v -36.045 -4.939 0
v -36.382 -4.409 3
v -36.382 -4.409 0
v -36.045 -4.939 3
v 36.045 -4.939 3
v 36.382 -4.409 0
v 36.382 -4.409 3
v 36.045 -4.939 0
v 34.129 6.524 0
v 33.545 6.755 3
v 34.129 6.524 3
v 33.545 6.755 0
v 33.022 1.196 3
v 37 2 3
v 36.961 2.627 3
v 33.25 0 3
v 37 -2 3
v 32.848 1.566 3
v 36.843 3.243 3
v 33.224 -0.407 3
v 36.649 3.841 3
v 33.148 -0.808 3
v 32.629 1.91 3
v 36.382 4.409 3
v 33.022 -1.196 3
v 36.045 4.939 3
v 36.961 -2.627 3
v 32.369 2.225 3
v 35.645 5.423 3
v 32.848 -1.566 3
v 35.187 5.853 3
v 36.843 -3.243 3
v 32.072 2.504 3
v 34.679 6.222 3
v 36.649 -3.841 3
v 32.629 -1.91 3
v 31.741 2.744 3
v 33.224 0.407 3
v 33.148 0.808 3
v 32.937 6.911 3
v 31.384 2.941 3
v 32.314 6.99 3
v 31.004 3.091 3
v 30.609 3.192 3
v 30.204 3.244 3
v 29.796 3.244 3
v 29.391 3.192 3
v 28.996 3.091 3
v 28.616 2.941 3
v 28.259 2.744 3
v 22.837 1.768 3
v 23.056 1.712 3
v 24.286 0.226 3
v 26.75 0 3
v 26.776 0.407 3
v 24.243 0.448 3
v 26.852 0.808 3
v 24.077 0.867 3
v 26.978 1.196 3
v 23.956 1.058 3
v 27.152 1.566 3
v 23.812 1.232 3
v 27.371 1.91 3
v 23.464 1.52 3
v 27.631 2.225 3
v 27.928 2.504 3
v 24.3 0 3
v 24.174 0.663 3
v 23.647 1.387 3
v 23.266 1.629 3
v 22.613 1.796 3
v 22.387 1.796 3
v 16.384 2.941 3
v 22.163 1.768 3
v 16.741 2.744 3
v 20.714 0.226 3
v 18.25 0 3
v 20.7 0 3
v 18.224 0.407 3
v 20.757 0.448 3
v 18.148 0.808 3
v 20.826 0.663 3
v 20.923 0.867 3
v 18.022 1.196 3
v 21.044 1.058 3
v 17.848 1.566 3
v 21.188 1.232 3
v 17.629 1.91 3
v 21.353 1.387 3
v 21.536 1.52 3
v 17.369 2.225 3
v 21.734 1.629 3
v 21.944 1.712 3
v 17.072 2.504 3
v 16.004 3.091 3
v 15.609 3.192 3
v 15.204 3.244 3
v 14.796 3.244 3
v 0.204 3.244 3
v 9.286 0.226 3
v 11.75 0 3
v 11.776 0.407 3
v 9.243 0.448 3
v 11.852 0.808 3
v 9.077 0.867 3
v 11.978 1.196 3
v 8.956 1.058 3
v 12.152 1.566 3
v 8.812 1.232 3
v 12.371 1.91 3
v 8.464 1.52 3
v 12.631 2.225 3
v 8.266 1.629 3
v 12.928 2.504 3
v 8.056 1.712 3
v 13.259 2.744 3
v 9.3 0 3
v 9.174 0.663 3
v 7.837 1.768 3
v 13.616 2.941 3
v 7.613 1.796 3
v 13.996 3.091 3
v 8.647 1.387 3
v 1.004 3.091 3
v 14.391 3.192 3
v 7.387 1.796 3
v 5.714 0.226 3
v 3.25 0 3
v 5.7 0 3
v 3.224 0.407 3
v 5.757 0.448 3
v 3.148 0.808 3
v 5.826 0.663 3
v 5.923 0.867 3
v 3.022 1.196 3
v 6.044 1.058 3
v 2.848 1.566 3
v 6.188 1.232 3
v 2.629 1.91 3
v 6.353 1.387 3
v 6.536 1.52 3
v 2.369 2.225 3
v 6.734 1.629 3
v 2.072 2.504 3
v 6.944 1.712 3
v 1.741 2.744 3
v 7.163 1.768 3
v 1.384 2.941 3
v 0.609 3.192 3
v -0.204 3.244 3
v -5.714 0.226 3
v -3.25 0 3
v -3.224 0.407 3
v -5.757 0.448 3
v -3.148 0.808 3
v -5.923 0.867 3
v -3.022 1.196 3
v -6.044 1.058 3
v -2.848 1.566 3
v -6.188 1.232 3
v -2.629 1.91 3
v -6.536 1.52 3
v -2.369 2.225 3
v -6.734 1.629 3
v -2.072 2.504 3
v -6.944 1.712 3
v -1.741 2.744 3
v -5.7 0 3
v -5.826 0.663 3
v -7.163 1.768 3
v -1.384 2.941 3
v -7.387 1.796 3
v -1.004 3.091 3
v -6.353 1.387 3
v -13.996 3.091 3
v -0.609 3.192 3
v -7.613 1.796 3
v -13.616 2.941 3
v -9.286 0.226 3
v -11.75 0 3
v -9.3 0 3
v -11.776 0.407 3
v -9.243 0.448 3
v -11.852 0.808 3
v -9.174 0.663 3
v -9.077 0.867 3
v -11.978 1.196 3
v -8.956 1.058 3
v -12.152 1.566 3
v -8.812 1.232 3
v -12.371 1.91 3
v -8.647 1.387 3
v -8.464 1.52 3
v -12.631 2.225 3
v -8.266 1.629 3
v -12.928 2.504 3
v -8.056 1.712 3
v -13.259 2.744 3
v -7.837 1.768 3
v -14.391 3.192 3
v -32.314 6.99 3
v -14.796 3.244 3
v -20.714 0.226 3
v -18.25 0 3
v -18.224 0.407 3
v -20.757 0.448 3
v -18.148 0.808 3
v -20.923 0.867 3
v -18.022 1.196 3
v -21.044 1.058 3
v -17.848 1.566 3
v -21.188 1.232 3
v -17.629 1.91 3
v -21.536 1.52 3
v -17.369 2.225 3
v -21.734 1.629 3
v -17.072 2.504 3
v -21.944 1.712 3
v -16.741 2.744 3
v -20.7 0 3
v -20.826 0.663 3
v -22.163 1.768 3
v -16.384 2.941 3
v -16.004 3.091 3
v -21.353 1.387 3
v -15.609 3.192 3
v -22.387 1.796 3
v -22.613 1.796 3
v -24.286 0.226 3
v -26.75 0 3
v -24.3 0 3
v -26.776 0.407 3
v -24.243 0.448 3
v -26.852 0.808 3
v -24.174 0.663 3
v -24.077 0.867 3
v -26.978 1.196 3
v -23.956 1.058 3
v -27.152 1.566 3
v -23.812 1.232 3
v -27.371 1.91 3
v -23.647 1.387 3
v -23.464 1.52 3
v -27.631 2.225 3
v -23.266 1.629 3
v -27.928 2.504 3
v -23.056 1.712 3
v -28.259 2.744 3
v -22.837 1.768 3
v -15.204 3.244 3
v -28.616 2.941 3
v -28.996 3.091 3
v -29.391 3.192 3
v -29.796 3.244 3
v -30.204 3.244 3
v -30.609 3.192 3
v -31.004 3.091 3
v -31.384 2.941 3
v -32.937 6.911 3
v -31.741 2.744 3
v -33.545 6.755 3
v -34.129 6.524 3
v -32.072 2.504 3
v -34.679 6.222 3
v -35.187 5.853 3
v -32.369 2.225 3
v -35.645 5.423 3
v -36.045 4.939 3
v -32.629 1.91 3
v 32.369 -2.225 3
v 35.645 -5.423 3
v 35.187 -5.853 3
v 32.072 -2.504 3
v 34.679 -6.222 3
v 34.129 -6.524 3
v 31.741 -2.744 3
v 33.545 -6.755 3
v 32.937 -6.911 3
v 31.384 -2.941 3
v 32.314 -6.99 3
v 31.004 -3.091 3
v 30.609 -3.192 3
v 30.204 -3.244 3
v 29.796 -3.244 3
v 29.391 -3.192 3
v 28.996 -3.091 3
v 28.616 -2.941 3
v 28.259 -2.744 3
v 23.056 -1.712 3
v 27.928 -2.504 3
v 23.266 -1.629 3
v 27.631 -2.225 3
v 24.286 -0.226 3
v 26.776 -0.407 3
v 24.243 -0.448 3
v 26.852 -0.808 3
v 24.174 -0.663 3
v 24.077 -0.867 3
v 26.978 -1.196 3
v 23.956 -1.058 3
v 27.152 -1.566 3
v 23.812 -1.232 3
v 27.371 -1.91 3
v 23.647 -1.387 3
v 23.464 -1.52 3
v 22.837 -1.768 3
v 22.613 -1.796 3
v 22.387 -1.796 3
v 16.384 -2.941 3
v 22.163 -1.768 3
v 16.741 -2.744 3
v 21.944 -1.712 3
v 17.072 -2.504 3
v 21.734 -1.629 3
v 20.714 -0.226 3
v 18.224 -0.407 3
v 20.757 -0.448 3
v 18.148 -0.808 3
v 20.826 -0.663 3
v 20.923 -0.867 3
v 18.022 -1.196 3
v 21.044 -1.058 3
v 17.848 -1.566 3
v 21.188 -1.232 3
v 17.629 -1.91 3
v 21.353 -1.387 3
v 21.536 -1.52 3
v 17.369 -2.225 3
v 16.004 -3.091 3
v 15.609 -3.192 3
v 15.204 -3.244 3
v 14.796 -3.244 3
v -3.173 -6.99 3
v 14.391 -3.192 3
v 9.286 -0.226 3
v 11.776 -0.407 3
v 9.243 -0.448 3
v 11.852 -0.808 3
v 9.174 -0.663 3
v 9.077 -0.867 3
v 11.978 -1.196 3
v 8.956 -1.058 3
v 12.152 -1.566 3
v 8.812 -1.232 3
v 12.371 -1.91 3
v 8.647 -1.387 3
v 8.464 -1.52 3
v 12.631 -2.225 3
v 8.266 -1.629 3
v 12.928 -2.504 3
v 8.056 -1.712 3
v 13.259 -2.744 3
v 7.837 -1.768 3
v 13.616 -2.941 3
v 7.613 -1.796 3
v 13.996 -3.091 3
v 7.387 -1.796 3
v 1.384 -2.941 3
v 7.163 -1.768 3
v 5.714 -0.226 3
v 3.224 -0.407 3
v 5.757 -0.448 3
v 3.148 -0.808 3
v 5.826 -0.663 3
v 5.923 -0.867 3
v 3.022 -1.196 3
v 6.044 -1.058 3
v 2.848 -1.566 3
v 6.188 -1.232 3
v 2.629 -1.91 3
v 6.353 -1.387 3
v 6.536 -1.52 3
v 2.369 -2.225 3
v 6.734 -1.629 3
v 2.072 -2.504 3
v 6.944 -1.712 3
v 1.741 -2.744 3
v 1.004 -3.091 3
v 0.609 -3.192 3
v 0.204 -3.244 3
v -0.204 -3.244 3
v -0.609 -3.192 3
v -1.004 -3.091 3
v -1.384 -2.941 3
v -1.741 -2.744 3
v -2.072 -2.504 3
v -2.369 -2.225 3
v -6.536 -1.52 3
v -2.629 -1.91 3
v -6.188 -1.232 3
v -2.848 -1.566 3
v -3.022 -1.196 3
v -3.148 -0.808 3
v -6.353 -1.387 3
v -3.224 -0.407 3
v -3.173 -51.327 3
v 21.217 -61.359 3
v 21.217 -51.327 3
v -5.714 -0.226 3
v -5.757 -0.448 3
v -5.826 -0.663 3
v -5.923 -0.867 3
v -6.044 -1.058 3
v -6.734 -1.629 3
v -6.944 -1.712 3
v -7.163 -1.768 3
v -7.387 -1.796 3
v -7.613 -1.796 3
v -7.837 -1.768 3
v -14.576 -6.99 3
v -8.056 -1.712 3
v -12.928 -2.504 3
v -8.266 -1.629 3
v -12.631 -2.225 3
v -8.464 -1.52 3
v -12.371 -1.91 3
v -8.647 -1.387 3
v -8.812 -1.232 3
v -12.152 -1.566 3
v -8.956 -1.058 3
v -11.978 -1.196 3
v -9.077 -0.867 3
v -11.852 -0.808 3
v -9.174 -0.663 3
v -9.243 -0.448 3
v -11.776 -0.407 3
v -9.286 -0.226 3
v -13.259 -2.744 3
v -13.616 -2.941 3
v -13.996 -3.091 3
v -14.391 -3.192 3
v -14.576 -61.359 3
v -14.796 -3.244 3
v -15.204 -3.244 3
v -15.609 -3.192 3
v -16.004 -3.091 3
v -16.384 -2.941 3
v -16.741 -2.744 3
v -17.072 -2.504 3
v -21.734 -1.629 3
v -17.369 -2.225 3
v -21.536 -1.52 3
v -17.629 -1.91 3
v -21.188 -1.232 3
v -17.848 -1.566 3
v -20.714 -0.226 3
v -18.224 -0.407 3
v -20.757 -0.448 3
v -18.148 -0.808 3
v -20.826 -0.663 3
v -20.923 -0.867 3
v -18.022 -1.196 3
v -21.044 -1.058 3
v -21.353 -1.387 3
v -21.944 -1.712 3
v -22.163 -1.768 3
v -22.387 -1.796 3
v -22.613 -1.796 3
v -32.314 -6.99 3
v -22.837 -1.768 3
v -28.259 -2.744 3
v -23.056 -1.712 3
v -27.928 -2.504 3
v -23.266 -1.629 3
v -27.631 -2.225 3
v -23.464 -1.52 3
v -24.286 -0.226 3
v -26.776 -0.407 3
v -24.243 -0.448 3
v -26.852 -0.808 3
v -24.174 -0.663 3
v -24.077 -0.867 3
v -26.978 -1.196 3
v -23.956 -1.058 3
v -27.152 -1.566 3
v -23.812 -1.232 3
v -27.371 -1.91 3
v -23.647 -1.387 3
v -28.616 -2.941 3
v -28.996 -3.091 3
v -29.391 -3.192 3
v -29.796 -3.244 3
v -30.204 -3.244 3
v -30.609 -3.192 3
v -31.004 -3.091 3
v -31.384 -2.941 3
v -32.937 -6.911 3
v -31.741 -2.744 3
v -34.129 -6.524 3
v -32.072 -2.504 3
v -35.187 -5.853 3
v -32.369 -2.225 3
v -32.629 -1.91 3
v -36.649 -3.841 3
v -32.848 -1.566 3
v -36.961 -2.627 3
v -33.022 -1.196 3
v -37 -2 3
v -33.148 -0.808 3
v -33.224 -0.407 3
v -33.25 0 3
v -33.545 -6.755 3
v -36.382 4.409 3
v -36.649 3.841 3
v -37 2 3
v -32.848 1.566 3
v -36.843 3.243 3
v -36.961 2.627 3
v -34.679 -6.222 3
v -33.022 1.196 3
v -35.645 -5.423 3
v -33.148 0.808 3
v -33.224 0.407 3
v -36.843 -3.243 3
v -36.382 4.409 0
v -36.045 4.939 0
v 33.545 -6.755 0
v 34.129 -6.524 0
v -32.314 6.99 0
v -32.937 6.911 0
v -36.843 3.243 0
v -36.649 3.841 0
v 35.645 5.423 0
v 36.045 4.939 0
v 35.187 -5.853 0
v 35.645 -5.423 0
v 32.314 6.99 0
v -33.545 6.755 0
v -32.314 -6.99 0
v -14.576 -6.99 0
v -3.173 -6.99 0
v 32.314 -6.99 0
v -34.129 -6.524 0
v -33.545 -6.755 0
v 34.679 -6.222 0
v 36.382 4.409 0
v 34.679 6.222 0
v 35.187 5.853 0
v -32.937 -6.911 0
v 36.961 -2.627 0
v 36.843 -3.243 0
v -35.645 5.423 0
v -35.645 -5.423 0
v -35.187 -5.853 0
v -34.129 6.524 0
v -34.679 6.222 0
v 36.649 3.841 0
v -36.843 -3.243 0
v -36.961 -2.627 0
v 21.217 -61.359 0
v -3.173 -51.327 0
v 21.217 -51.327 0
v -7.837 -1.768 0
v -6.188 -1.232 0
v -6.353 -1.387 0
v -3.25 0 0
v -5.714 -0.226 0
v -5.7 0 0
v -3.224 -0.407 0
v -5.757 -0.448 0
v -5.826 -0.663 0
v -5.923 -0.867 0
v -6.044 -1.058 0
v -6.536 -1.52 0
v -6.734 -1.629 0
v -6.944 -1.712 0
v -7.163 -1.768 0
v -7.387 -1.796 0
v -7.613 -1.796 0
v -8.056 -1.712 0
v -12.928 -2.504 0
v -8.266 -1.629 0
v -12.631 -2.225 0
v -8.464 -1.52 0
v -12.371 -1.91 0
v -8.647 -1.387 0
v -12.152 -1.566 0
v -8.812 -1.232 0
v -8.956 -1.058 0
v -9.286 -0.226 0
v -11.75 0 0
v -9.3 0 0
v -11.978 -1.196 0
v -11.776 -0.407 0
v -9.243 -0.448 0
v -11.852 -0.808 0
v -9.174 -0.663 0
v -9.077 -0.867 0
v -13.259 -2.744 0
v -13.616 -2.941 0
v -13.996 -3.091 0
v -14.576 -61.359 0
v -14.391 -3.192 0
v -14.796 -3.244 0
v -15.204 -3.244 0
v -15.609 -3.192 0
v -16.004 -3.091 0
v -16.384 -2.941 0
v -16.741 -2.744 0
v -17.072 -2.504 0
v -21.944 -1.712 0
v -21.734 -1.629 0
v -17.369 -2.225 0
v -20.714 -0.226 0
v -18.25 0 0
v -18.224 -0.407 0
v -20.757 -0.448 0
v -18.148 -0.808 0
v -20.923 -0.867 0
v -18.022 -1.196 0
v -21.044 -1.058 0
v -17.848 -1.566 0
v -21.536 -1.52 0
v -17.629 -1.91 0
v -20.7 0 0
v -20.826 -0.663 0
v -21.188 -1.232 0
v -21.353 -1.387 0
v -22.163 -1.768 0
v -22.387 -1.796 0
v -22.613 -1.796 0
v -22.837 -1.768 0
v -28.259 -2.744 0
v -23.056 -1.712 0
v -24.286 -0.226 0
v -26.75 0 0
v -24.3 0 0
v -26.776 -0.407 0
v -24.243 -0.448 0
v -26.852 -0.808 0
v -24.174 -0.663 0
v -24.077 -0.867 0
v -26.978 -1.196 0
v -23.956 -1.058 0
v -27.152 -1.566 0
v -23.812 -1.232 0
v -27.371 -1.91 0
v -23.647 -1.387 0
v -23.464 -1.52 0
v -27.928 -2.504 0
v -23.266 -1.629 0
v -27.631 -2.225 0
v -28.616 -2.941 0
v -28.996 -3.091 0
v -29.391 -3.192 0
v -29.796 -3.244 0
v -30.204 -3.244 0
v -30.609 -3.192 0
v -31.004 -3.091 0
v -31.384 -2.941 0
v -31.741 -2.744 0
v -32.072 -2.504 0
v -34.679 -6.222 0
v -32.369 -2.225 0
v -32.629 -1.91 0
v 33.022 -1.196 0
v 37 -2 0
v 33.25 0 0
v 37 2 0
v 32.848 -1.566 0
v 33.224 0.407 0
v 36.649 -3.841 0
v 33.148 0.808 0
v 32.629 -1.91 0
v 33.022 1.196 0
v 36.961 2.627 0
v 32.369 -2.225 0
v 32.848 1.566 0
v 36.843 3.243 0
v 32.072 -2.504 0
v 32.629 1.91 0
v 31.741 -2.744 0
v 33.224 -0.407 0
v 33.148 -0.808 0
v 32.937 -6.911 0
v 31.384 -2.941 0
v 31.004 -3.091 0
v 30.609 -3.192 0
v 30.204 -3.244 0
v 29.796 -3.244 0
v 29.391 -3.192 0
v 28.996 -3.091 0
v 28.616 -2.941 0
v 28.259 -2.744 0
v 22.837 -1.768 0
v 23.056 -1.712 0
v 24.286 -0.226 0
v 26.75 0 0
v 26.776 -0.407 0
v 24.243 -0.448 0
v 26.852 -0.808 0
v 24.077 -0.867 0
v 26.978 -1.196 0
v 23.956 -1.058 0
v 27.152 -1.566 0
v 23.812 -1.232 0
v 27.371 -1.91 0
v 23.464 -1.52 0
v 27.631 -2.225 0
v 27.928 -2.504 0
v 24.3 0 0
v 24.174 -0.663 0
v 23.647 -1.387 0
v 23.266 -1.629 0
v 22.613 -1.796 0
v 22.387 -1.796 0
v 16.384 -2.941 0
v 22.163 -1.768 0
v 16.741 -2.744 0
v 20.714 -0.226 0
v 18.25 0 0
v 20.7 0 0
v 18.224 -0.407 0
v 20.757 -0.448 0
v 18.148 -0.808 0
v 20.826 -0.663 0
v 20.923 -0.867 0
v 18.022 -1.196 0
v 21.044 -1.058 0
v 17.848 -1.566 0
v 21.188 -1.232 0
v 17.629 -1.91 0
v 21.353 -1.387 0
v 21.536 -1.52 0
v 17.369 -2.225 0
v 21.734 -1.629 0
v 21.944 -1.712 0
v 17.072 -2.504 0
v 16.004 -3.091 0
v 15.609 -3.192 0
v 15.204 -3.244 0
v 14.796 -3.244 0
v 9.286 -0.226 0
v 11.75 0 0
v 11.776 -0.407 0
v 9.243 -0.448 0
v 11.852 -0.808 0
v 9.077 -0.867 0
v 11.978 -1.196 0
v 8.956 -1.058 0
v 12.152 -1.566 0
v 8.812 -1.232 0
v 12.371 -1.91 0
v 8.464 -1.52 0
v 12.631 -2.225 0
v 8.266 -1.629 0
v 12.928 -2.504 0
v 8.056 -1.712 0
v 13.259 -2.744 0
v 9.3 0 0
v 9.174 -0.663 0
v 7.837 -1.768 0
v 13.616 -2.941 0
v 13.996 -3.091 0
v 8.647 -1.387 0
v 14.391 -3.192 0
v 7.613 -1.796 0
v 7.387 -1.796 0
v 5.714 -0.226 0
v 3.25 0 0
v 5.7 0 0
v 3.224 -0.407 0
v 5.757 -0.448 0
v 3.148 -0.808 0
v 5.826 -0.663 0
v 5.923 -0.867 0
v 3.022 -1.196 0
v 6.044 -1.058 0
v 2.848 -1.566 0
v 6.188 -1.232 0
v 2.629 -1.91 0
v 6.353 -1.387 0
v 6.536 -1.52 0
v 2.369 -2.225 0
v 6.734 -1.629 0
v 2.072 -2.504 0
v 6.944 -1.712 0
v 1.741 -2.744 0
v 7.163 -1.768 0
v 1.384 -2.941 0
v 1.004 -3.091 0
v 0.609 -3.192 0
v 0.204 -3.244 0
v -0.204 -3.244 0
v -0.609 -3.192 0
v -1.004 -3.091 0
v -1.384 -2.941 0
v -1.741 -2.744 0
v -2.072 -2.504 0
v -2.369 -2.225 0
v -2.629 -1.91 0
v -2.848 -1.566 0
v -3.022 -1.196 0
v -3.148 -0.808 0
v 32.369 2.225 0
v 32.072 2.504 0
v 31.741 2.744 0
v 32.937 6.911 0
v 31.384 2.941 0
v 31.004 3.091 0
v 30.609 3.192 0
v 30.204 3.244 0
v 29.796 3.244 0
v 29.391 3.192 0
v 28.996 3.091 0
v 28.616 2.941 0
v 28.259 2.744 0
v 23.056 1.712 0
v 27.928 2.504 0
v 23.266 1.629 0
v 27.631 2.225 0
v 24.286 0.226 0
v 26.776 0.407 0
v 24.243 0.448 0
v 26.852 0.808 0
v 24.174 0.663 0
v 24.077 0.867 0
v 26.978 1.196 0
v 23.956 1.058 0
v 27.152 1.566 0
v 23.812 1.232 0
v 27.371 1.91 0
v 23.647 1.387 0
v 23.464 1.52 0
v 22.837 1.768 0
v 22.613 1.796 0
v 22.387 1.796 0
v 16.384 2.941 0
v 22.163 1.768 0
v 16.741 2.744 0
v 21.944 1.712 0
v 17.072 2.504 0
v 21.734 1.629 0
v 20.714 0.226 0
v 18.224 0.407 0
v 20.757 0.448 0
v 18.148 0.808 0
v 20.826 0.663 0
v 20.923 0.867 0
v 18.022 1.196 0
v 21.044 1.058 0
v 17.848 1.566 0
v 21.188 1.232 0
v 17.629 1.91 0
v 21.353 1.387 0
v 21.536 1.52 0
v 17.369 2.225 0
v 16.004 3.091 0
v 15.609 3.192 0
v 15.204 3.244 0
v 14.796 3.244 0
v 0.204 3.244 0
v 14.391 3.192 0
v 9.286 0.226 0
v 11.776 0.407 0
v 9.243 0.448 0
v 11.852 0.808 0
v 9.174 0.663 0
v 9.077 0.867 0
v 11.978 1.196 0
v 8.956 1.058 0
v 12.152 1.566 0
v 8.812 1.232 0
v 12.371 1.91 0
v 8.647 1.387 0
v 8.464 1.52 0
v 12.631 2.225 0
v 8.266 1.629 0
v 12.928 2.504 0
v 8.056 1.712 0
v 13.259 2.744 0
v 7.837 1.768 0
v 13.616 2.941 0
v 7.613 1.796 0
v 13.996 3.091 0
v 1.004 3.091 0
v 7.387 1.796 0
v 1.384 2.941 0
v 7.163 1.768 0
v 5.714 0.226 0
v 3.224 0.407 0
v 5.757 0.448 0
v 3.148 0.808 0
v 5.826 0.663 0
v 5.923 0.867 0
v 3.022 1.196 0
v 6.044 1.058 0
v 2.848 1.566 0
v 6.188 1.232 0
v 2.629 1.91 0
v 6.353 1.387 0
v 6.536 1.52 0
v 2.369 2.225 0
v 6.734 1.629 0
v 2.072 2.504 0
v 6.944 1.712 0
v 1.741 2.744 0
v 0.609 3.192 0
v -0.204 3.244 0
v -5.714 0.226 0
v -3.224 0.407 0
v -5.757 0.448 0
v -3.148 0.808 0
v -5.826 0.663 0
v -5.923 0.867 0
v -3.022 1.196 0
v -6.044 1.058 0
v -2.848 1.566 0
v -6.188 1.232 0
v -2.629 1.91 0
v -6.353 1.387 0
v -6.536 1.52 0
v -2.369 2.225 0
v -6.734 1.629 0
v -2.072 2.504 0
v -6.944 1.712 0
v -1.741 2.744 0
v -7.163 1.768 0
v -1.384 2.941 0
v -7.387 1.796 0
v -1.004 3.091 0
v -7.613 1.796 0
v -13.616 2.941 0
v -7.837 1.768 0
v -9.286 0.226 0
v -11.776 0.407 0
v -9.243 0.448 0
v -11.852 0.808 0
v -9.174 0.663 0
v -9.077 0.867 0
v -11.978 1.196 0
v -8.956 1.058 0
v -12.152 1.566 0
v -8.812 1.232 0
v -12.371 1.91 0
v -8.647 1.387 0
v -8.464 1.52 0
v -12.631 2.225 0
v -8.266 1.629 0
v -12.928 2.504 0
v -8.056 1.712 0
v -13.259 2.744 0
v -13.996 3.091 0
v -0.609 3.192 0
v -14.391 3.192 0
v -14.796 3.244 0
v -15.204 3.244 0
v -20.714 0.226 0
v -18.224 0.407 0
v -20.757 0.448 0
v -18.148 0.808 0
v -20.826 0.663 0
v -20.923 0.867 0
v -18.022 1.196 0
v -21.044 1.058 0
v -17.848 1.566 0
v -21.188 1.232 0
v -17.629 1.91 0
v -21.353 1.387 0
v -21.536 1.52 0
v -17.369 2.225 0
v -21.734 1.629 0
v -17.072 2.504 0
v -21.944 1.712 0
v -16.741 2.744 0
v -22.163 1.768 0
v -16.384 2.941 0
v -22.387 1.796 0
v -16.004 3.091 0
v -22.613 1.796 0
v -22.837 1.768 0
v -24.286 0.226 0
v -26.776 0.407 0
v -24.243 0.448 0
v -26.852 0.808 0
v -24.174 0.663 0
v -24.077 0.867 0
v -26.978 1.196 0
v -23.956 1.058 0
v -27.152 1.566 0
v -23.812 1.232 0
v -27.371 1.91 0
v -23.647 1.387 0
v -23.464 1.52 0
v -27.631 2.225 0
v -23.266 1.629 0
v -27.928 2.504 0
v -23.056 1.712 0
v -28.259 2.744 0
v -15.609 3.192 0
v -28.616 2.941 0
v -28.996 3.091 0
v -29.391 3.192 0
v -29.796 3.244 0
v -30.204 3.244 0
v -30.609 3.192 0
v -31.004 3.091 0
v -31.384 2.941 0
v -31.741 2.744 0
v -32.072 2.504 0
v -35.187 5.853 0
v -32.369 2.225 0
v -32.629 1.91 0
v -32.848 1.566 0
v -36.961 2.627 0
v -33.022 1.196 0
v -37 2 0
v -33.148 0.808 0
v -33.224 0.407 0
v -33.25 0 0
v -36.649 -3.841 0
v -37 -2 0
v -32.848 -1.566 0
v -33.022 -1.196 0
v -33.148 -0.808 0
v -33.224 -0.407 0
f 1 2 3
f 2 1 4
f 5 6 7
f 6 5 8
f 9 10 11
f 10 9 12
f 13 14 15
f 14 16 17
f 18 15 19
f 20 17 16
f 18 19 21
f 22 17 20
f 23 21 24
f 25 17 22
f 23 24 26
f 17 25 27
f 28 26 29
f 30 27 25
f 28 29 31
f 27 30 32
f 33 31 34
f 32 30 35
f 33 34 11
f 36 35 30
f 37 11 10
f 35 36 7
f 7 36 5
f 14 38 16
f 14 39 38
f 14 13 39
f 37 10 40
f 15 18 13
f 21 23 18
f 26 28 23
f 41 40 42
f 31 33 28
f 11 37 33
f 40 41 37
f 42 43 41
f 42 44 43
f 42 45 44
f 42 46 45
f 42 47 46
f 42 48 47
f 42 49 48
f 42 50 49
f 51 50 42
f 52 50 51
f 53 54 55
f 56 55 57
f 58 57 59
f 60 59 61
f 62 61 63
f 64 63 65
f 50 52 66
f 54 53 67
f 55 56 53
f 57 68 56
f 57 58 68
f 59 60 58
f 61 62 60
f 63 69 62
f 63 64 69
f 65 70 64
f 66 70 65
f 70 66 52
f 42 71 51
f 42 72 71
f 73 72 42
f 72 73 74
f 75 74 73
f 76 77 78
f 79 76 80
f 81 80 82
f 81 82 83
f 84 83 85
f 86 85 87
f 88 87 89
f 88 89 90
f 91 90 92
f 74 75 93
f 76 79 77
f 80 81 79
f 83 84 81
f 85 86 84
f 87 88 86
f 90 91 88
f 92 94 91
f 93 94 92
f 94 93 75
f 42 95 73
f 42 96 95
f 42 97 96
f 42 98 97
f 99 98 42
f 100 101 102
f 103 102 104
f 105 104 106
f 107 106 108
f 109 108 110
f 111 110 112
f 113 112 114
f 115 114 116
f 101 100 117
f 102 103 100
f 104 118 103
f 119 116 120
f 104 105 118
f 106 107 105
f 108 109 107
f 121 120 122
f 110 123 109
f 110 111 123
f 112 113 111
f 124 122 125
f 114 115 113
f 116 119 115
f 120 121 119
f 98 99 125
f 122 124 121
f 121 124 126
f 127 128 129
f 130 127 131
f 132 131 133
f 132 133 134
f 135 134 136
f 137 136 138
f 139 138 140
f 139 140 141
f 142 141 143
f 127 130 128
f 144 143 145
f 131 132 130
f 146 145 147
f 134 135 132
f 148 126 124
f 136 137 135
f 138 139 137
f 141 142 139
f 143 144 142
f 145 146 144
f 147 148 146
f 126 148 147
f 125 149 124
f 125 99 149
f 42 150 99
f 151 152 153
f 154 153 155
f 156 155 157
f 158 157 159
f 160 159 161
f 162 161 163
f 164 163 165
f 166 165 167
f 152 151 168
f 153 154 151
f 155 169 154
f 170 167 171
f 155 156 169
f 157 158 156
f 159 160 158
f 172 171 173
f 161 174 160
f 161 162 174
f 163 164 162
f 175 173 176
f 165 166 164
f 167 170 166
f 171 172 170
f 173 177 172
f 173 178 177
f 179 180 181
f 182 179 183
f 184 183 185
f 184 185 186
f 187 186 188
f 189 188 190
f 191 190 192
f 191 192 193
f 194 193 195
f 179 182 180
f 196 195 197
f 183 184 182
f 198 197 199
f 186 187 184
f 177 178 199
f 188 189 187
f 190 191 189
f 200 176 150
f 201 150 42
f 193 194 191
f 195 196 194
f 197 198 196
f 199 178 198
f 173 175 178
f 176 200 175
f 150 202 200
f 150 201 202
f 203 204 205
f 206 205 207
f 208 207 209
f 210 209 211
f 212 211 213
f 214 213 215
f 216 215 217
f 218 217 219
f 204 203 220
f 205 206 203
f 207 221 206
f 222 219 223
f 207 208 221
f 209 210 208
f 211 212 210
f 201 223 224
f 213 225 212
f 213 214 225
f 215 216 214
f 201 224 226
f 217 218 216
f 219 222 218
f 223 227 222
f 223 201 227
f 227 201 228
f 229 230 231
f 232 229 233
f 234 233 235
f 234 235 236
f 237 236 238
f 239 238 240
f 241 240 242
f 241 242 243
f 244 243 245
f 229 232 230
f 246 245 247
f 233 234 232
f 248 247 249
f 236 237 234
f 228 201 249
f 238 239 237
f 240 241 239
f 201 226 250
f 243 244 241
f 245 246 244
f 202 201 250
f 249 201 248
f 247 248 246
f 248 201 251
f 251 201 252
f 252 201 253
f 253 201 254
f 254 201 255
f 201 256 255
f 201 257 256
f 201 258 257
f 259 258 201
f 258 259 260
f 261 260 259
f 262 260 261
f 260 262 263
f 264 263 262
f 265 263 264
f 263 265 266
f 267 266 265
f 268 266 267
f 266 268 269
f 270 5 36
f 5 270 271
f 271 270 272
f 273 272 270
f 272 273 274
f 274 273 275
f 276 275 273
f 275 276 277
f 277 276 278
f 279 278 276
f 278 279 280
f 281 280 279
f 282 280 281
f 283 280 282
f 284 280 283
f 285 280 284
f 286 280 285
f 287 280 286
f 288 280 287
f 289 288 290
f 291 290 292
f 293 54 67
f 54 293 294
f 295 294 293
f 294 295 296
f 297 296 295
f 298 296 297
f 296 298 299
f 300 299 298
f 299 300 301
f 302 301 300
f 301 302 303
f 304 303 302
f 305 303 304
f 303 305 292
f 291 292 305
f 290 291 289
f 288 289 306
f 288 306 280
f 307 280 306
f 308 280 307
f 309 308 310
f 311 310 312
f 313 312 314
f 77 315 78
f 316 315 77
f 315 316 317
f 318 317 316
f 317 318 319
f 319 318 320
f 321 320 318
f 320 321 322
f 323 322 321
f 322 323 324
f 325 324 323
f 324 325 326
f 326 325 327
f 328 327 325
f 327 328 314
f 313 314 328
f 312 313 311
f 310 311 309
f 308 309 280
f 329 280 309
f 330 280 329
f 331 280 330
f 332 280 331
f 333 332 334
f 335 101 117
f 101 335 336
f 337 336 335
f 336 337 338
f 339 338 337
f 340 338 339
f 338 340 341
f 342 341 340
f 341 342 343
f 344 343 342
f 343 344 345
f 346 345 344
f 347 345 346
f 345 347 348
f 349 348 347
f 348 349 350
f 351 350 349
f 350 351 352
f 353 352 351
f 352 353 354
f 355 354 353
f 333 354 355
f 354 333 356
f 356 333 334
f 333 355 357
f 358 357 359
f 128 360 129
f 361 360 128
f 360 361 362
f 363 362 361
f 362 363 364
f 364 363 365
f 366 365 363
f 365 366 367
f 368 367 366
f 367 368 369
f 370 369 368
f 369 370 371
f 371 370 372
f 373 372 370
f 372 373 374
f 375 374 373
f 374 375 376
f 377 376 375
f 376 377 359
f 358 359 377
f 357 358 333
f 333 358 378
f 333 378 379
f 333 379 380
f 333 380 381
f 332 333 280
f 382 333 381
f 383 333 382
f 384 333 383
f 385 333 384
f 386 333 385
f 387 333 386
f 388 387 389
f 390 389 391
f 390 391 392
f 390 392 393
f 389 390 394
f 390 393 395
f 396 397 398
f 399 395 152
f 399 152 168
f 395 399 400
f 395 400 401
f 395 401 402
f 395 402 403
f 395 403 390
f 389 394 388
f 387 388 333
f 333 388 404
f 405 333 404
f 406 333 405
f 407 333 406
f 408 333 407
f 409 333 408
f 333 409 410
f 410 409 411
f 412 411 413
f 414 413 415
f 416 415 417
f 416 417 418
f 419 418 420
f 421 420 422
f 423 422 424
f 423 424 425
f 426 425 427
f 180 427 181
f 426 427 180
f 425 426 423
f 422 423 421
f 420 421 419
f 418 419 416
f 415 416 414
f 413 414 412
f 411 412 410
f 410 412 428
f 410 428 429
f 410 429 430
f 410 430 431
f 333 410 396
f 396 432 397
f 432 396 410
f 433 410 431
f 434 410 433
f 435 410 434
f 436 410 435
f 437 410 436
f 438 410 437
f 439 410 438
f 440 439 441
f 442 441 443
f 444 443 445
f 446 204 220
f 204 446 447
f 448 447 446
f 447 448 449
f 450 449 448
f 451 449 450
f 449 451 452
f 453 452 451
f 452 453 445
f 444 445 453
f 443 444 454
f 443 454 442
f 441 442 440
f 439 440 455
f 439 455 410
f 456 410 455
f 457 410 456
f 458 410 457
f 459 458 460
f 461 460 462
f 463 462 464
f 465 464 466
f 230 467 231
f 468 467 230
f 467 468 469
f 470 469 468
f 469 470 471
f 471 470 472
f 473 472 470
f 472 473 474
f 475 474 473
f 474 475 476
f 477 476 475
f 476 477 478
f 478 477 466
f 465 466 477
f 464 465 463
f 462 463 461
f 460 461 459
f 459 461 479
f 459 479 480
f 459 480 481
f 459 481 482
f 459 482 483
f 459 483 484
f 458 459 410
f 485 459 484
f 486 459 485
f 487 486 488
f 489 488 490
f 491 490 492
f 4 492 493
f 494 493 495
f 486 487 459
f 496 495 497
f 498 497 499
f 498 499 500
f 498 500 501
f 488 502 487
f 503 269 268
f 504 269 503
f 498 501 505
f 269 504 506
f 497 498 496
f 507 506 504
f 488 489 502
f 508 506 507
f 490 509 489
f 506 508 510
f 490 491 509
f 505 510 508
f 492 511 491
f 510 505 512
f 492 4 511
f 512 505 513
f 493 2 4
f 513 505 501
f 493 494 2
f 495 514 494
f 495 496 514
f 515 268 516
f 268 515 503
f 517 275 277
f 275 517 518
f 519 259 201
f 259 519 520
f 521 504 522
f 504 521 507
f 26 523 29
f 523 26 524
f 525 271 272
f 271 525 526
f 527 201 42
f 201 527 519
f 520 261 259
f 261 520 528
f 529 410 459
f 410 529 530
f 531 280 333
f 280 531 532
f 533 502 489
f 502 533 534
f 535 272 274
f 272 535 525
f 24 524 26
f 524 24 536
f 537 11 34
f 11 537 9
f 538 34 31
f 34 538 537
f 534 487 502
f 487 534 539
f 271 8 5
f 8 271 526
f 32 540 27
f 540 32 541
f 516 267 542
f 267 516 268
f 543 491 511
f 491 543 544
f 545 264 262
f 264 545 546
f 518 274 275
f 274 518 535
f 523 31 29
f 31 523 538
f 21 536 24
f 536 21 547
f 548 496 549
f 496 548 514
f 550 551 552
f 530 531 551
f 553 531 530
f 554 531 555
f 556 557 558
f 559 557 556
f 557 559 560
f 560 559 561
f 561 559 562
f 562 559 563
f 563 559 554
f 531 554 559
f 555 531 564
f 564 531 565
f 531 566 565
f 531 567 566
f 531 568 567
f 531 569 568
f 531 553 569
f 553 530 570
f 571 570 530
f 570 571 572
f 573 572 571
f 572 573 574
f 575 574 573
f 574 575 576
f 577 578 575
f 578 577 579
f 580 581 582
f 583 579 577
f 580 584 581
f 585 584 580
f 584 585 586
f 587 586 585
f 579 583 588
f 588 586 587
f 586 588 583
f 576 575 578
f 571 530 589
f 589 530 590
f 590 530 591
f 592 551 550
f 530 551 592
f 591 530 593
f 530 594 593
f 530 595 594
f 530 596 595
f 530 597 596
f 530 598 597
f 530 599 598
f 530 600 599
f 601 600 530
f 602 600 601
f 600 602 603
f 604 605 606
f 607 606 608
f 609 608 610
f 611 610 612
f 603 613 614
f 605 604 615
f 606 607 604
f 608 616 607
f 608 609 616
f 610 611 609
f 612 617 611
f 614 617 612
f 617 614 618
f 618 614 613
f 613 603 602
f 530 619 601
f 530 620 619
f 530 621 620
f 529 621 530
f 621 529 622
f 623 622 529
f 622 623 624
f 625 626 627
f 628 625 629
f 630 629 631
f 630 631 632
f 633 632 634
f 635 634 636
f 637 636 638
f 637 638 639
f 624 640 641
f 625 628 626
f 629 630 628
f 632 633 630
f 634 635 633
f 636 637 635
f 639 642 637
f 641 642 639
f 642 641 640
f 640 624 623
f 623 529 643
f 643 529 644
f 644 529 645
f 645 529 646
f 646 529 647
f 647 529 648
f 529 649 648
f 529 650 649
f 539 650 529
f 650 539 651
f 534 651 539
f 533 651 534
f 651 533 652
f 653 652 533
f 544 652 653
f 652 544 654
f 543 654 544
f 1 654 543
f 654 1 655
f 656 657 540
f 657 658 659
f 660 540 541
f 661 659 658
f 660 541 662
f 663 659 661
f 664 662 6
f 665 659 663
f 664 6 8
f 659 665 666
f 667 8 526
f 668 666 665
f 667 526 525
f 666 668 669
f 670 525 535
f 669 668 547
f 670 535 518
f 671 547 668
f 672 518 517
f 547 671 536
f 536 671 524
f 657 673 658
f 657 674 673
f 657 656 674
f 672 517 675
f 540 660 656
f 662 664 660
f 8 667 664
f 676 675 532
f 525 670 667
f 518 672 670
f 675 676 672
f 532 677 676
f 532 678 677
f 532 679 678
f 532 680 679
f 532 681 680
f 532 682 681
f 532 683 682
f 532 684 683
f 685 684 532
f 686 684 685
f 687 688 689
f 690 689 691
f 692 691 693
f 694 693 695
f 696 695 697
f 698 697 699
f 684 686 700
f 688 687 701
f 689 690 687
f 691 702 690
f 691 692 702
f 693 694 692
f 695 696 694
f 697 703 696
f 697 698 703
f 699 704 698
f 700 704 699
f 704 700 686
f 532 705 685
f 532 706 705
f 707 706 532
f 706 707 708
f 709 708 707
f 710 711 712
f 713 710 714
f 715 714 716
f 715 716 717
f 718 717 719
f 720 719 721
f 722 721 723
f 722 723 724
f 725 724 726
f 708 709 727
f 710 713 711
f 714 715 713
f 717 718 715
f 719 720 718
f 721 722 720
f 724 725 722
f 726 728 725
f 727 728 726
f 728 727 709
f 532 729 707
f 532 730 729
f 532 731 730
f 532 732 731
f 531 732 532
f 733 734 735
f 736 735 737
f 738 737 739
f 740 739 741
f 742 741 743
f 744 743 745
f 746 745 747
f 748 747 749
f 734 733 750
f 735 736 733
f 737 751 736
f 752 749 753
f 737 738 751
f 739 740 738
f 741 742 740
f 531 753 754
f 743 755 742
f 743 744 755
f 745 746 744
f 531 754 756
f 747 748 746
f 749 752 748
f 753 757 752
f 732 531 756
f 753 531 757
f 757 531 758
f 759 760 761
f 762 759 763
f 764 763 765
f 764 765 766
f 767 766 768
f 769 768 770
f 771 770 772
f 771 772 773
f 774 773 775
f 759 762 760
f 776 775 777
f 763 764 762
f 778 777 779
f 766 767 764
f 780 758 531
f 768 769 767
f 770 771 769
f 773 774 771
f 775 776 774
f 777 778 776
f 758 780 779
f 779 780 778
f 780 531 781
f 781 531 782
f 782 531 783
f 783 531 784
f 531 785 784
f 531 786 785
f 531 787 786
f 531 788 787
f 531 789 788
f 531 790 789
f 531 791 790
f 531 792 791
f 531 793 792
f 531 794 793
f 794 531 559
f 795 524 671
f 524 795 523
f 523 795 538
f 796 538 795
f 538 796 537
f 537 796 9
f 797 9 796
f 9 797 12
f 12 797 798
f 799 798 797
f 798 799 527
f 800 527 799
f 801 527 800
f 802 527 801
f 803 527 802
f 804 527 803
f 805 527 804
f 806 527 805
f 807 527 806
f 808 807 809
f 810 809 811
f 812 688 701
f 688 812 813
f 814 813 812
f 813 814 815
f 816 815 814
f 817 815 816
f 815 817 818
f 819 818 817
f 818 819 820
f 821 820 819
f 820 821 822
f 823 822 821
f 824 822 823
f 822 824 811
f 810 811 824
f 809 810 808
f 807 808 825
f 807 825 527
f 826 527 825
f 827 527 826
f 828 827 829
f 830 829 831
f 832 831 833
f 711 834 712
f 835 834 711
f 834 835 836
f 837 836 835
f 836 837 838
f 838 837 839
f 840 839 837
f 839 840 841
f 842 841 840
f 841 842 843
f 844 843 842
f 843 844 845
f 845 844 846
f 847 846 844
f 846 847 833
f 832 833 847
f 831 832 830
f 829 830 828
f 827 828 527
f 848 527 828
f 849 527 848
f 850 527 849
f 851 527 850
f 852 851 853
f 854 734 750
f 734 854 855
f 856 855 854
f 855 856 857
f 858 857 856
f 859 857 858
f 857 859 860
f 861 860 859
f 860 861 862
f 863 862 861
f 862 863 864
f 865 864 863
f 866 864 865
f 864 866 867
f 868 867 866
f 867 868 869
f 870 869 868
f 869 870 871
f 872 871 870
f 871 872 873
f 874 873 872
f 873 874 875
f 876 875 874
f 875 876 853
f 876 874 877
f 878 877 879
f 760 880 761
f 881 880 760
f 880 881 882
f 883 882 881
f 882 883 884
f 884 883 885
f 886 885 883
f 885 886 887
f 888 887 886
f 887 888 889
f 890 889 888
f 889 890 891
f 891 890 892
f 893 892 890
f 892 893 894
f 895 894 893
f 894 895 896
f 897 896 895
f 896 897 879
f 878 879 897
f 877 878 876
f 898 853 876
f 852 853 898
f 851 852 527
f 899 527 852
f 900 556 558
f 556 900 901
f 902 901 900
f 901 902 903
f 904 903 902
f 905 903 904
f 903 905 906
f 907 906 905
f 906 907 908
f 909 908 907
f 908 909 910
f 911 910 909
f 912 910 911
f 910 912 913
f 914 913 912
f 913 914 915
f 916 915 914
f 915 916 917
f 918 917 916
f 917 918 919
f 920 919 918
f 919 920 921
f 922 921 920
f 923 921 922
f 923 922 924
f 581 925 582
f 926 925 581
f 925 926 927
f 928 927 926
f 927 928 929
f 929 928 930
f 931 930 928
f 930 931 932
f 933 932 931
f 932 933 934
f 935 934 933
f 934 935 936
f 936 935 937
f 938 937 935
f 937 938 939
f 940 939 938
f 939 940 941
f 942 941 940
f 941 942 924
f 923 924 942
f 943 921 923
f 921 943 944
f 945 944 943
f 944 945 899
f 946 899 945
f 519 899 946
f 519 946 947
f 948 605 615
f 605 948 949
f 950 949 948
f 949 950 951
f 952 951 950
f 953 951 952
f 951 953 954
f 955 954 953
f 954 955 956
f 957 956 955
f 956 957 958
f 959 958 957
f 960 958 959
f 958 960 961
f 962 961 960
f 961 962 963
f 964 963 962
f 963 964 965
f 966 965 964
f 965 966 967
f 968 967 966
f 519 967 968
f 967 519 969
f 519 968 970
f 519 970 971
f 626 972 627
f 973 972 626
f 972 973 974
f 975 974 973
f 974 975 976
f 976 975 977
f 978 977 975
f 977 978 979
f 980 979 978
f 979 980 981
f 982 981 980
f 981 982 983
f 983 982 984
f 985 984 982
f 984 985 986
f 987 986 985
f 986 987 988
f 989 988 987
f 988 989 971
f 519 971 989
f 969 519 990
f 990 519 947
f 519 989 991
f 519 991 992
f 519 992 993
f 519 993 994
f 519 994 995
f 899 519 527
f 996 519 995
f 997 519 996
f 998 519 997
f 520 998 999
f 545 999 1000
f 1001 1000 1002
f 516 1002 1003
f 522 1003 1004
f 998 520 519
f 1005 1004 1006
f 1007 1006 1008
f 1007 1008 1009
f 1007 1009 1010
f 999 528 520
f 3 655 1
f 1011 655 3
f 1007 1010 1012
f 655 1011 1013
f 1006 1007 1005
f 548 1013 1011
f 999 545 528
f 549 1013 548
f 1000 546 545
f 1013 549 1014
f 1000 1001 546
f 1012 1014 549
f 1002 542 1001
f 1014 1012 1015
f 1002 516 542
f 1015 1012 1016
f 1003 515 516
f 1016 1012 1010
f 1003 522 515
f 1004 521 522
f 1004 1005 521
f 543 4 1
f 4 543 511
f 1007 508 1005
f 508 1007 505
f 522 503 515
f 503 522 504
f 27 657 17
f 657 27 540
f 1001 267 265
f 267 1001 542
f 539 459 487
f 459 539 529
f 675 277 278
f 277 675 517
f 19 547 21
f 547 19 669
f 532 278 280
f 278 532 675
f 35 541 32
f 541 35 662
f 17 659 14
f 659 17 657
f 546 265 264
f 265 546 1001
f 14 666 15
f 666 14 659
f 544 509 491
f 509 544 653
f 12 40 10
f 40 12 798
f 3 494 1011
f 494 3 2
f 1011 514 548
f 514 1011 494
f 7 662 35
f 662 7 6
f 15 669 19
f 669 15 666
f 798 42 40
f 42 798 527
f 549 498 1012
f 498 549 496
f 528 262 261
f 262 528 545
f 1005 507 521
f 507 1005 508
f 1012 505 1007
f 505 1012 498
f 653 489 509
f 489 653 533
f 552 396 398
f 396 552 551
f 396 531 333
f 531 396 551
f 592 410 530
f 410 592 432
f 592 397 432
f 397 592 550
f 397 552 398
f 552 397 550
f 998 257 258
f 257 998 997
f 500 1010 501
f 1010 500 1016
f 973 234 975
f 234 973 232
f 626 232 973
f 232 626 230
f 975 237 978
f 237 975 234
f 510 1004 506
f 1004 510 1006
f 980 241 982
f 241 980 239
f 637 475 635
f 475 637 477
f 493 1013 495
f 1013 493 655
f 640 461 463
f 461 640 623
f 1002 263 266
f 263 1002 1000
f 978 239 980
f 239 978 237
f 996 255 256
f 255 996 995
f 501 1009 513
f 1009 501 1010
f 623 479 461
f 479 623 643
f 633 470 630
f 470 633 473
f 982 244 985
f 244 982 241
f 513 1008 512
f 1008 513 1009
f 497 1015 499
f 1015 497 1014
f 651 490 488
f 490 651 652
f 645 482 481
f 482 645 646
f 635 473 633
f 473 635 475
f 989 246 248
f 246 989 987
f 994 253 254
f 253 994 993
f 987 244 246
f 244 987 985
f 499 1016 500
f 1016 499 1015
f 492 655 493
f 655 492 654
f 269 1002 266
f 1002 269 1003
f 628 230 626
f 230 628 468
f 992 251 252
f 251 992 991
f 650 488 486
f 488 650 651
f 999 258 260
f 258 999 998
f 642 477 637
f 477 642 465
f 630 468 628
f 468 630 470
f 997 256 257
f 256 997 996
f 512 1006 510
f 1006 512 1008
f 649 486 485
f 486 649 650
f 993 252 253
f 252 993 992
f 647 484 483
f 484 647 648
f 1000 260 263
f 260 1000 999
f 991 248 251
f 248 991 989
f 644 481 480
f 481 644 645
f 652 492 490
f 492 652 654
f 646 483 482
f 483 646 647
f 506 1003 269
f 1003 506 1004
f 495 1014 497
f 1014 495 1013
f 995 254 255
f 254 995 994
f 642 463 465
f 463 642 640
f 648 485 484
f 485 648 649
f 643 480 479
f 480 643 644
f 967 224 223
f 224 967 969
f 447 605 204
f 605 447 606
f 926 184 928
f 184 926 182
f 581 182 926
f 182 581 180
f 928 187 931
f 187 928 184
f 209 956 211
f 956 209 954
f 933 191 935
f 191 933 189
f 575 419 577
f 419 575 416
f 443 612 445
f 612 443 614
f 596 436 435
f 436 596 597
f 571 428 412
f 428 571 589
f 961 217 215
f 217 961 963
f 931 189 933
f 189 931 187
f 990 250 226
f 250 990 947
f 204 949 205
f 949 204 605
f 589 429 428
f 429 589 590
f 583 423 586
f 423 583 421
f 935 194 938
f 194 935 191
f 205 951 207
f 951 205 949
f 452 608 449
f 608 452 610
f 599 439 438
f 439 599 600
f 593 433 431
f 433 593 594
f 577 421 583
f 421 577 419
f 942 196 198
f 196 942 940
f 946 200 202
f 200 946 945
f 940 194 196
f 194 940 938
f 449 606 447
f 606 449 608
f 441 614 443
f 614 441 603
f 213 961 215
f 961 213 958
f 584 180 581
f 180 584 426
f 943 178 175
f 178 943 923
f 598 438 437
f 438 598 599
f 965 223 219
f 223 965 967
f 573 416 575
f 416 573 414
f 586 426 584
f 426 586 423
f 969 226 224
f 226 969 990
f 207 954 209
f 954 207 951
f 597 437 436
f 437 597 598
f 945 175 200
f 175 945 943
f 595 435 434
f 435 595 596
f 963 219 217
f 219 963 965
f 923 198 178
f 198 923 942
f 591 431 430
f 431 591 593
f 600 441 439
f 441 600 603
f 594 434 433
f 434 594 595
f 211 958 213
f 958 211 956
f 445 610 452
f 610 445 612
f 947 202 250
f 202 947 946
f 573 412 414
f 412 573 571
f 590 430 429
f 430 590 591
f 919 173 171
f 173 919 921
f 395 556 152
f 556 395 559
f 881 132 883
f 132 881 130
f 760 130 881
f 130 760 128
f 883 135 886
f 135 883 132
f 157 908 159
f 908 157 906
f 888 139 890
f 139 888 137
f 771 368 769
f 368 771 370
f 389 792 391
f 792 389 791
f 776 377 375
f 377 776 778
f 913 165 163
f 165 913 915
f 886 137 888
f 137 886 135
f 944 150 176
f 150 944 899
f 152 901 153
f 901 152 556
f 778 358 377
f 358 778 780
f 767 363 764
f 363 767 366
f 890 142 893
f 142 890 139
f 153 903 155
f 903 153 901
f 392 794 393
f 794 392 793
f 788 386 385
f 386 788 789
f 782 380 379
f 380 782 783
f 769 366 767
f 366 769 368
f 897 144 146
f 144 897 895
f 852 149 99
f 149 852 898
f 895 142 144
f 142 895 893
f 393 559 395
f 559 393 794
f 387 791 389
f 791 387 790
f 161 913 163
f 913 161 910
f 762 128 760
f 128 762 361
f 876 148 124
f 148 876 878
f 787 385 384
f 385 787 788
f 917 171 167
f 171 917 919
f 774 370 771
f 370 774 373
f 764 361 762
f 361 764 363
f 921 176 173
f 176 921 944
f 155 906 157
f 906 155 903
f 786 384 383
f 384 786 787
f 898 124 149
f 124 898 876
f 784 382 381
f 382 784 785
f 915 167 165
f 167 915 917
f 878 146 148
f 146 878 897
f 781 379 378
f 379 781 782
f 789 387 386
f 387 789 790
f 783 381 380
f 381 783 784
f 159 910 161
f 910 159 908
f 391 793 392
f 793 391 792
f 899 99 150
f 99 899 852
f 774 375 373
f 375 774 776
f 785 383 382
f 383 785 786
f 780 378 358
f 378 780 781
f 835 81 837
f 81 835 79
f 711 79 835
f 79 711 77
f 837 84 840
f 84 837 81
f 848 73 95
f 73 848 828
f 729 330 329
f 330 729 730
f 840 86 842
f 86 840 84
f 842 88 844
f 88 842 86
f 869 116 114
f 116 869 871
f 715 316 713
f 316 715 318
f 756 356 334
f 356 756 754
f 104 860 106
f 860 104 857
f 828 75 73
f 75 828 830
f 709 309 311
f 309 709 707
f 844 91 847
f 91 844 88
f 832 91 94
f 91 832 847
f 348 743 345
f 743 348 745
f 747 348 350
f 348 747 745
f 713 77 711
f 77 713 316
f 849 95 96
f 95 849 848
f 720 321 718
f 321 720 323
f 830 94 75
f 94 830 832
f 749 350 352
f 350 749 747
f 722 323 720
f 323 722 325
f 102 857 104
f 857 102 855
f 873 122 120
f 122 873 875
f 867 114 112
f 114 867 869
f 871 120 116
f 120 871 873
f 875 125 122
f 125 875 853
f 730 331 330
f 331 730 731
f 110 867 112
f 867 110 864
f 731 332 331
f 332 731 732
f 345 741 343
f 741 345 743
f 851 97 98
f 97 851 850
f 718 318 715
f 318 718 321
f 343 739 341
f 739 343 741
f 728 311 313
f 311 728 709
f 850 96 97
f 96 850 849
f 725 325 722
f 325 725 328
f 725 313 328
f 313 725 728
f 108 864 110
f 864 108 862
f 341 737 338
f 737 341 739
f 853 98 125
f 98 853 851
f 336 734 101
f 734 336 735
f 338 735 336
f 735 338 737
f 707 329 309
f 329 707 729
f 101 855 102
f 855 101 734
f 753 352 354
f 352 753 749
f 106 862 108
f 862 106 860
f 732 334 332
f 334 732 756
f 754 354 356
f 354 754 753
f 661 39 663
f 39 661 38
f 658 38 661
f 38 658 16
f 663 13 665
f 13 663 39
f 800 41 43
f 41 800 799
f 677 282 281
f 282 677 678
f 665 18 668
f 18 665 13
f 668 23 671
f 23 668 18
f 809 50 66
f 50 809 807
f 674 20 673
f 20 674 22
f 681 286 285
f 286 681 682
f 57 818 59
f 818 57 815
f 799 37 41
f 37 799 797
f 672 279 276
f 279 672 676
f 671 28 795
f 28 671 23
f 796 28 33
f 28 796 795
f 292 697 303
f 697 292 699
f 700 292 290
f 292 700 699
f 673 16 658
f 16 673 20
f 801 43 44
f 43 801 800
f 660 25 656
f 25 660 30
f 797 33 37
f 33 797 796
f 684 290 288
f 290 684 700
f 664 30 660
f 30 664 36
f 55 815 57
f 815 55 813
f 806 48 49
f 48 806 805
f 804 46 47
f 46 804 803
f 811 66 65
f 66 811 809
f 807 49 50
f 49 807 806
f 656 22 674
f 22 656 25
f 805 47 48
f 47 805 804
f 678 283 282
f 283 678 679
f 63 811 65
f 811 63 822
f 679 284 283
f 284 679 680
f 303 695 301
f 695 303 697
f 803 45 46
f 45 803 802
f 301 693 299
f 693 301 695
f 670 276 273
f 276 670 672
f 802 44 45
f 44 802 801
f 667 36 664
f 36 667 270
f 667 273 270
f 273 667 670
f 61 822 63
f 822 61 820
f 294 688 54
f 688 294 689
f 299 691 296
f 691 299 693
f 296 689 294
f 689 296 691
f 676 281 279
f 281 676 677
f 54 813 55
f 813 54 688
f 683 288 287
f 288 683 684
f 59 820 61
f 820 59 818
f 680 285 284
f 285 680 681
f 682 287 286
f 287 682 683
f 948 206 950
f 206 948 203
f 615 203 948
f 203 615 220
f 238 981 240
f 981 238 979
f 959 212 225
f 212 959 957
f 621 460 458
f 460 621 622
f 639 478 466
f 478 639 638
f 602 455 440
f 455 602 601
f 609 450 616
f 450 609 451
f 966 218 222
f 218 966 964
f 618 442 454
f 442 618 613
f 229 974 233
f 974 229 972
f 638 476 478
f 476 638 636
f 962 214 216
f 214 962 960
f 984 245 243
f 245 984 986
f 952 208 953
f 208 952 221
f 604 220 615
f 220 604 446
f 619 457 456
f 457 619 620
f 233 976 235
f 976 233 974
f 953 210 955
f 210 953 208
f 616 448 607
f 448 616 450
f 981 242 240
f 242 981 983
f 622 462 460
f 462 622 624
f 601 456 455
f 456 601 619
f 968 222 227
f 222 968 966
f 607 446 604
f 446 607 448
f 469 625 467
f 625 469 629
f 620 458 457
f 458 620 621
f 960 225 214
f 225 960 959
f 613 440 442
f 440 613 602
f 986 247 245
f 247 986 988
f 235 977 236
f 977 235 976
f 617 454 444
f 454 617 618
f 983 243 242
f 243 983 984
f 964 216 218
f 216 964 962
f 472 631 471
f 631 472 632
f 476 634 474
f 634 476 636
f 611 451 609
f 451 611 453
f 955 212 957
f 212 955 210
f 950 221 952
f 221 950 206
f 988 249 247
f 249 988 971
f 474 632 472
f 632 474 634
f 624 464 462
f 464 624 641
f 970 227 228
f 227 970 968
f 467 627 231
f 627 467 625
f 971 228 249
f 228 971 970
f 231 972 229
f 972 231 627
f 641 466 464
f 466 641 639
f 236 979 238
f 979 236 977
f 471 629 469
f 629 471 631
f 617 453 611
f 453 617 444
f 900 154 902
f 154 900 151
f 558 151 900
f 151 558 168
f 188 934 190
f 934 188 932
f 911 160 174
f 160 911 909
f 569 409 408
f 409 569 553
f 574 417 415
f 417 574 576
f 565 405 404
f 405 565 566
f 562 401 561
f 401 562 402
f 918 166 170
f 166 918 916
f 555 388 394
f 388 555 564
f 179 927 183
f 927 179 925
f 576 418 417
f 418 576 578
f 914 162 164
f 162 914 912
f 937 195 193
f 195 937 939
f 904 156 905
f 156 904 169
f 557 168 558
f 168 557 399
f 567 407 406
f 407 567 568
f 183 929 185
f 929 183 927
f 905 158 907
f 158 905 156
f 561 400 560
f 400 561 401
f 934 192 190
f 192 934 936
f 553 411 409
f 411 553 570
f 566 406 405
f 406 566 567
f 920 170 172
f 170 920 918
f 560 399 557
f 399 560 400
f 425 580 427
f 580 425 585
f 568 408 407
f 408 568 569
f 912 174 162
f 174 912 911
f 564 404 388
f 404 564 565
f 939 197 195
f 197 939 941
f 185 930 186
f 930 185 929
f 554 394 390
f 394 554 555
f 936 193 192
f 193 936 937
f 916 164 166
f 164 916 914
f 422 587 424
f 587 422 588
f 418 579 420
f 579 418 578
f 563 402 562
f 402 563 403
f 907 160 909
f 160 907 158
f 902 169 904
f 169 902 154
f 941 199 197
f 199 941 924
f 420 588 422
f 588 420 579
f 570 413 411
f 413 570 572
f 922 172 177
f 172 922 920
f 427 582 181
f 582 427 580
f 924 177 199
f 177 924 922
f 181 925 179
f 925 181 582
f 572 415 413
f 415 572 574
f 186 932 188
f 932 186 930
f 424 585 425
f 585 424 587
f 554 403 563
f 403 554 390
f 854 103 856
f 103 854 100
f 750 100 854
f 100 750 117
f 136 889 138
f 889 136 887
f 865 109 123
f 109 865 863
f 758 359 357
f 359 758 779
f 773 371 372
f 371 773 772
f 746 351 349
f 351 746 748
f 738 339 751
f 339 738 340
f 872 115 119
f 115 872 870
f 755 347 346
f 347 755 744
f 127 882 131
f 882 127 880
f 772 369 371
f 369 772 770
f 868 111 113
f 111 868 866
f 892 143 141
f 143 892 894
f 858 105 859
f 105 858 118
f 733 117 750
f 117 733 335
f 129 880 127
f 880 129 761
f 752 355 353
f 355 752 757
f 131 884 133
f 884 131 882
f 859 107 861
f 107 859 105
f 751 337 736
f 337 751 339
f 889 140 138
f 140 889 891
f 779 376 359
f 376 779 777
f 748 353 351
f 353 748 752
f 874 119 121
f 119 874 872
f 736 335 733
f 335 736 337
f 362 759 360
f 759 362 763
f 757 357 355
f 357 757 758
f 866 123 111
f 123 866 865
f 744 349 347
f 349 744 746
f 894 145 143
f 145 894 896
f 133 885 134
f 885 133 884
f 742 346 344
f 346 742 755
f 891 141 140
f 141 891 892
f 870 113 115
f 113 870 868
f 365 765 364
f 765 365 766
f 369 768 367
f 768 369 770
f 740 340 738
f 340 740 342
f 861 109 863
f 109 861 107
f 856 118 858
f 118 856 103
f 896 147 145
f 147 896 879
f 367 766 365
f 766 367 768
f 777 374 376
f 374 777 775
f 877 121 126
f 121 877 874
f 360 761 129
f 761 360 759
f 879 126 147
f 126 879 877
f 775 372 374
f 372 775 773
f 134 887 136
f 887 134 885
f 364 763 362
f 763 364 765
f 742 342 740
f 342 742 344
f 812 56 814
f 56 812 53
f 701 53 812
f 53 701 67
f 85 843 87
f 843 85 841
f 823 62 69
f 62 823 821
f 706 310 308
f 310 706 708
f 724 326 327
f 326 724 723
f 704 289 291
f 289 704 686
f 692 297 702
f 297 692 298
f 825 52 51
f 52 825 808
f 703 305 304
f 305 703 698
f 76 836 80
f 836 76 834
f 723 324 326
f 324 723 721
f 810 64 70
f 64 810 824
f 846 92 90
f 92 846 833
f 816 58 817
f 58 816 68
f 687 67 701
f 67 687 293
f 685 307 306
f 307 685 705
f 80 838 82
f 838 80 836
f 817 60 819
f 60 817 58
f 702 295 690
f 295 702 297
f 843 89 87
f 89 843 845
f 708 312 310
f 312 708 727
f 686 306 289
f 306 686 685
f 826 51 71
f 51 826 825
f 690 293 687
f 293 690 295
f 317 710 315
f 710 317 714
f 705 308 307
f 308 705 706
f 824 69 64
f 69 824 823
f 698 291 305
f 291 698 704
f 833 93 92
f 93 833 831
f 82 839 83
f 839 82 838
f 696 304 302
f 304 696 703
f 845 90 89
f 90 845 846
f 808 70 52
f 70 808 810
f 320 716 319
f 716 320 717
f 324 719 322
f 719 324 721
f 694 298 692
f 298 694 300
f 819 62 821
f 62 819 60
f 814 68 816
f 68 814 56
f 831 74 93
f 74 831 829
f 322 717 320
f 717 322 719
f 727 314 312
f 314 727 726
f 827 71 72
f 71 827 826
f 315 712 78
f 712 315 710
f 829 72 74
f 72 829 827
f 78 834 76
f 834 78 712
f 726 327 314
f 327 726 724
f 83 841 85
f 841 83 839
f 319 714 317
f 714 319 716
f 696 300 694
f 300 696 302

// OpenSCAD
$fn = 50;


difference() {
	union() {
		hull() {
			translate(v = [-32.0000000000, 2.0000000000, 0]) {
				cylinder(h = 3, r = 5);
			}
			translate(v = [32.0000000000, 2.0000000000, 0]) {
				cylinder(h = 3, r = 5);
			}
			translate(v = [-32.0000000000, -2.0000000000, 0]) {
				cylinder(h = 3, r = 5);
			}
			translate(v = [32.0000000000, -2.0000000000, 0]) {
				cylinder(h = 3, r = 5);
			}
		}
		translate(v = [0, -5, 0]) {
			linear_extrude(height = 3) {
				text(font = "DejaVu Sans Mono:style=Bold", halign = "center", size = 57.0000000000, text = "L", valign = "top");
			}
		}
	}
	union() {
		translate(v = [-30.0000000000, 0.0000000000, 0]) {
			translate(v = [0, 0, -100]) {
				cylinder(h = 200, r = 3.2500000000);
			}
		}
		translate(v = [-15.0000000000, 0.0000000000, 0]) {
			translate(v = [0, 0, -100]) {
				cylinder(h = 200, r = 3.2500000000);
			}
		}
		translate(v = [0, 0, -100]) {
			cylinder(h = 200, r = 3.2500000000);
		}
		translate(v = [15.0000000000, 0.0000000000, 0]) {
			translate(v = [0, 0, -100]) {
				cylinder(h = 200, r = 3.2500000000);
			}
		}
		translate(v = [30.0000000000, 0.0000000000, 0]) {
			translate(v = [0, 0, -100]) {
				cylinder(h = 200, r = 3.2500000000);
			}
		}
		translate(v = [-30.0000000000, 0.0000000000, 0]) {
			translate(v = [0, 0, -100]) {
				cylinder(h = 200, r = 1.8000000000);
			}
		}
		translate(v = [-22.5000000000, 0.0000000000, 0]) {
			translate(v = [0, 0, -100]) {
				cylinder(h = 200, r = 1.8000000000);
			}
		}
		translate(v = [-15.0000000000, 0.0000000000, 0]) {
			translate(v = [0, 0, -100]) {
				cylinder(h = 200, r = 1.8000000000);
			}
		}
		translate(v = [-7.5000000000, 0.0000000000, 0]) {
			translate(v = [0, 0, -100]) {
				cylinder(h = 200, r = 1.8000000000);
			}
		}
		translate(v = [0, 0, -100]) {
			cylinder(h = 200, r = 1.8000000000);
		}
		translate(v = [7.5000000000, 0.0000000000, 0]) {
			translate(v = [0, 0, -100]) {
				cylinder(h = 200, r = 1.8000000000);
			}
		}
		translate(v = [15.0000000000, 0.0000000000, 0]) {
			translate(v = [0, 0, -100]) {
				cylinder(h = 200, r = 1.8000000000);
			}
		}
		translate(v = [22.5000000000, 0.0000000000, 0]) {
			translate(v = [0, 0, -100]) {
				cylinder(h = 200, r = 1.8000000000);
			}
		}
		translate(v = [30.0000000000, 0.0000000000, 0]) {
			translate(v = [0, 0, -100]) {
				cylinder(h = 200, r = 1.8000000000);
			}
		}
	}
}
